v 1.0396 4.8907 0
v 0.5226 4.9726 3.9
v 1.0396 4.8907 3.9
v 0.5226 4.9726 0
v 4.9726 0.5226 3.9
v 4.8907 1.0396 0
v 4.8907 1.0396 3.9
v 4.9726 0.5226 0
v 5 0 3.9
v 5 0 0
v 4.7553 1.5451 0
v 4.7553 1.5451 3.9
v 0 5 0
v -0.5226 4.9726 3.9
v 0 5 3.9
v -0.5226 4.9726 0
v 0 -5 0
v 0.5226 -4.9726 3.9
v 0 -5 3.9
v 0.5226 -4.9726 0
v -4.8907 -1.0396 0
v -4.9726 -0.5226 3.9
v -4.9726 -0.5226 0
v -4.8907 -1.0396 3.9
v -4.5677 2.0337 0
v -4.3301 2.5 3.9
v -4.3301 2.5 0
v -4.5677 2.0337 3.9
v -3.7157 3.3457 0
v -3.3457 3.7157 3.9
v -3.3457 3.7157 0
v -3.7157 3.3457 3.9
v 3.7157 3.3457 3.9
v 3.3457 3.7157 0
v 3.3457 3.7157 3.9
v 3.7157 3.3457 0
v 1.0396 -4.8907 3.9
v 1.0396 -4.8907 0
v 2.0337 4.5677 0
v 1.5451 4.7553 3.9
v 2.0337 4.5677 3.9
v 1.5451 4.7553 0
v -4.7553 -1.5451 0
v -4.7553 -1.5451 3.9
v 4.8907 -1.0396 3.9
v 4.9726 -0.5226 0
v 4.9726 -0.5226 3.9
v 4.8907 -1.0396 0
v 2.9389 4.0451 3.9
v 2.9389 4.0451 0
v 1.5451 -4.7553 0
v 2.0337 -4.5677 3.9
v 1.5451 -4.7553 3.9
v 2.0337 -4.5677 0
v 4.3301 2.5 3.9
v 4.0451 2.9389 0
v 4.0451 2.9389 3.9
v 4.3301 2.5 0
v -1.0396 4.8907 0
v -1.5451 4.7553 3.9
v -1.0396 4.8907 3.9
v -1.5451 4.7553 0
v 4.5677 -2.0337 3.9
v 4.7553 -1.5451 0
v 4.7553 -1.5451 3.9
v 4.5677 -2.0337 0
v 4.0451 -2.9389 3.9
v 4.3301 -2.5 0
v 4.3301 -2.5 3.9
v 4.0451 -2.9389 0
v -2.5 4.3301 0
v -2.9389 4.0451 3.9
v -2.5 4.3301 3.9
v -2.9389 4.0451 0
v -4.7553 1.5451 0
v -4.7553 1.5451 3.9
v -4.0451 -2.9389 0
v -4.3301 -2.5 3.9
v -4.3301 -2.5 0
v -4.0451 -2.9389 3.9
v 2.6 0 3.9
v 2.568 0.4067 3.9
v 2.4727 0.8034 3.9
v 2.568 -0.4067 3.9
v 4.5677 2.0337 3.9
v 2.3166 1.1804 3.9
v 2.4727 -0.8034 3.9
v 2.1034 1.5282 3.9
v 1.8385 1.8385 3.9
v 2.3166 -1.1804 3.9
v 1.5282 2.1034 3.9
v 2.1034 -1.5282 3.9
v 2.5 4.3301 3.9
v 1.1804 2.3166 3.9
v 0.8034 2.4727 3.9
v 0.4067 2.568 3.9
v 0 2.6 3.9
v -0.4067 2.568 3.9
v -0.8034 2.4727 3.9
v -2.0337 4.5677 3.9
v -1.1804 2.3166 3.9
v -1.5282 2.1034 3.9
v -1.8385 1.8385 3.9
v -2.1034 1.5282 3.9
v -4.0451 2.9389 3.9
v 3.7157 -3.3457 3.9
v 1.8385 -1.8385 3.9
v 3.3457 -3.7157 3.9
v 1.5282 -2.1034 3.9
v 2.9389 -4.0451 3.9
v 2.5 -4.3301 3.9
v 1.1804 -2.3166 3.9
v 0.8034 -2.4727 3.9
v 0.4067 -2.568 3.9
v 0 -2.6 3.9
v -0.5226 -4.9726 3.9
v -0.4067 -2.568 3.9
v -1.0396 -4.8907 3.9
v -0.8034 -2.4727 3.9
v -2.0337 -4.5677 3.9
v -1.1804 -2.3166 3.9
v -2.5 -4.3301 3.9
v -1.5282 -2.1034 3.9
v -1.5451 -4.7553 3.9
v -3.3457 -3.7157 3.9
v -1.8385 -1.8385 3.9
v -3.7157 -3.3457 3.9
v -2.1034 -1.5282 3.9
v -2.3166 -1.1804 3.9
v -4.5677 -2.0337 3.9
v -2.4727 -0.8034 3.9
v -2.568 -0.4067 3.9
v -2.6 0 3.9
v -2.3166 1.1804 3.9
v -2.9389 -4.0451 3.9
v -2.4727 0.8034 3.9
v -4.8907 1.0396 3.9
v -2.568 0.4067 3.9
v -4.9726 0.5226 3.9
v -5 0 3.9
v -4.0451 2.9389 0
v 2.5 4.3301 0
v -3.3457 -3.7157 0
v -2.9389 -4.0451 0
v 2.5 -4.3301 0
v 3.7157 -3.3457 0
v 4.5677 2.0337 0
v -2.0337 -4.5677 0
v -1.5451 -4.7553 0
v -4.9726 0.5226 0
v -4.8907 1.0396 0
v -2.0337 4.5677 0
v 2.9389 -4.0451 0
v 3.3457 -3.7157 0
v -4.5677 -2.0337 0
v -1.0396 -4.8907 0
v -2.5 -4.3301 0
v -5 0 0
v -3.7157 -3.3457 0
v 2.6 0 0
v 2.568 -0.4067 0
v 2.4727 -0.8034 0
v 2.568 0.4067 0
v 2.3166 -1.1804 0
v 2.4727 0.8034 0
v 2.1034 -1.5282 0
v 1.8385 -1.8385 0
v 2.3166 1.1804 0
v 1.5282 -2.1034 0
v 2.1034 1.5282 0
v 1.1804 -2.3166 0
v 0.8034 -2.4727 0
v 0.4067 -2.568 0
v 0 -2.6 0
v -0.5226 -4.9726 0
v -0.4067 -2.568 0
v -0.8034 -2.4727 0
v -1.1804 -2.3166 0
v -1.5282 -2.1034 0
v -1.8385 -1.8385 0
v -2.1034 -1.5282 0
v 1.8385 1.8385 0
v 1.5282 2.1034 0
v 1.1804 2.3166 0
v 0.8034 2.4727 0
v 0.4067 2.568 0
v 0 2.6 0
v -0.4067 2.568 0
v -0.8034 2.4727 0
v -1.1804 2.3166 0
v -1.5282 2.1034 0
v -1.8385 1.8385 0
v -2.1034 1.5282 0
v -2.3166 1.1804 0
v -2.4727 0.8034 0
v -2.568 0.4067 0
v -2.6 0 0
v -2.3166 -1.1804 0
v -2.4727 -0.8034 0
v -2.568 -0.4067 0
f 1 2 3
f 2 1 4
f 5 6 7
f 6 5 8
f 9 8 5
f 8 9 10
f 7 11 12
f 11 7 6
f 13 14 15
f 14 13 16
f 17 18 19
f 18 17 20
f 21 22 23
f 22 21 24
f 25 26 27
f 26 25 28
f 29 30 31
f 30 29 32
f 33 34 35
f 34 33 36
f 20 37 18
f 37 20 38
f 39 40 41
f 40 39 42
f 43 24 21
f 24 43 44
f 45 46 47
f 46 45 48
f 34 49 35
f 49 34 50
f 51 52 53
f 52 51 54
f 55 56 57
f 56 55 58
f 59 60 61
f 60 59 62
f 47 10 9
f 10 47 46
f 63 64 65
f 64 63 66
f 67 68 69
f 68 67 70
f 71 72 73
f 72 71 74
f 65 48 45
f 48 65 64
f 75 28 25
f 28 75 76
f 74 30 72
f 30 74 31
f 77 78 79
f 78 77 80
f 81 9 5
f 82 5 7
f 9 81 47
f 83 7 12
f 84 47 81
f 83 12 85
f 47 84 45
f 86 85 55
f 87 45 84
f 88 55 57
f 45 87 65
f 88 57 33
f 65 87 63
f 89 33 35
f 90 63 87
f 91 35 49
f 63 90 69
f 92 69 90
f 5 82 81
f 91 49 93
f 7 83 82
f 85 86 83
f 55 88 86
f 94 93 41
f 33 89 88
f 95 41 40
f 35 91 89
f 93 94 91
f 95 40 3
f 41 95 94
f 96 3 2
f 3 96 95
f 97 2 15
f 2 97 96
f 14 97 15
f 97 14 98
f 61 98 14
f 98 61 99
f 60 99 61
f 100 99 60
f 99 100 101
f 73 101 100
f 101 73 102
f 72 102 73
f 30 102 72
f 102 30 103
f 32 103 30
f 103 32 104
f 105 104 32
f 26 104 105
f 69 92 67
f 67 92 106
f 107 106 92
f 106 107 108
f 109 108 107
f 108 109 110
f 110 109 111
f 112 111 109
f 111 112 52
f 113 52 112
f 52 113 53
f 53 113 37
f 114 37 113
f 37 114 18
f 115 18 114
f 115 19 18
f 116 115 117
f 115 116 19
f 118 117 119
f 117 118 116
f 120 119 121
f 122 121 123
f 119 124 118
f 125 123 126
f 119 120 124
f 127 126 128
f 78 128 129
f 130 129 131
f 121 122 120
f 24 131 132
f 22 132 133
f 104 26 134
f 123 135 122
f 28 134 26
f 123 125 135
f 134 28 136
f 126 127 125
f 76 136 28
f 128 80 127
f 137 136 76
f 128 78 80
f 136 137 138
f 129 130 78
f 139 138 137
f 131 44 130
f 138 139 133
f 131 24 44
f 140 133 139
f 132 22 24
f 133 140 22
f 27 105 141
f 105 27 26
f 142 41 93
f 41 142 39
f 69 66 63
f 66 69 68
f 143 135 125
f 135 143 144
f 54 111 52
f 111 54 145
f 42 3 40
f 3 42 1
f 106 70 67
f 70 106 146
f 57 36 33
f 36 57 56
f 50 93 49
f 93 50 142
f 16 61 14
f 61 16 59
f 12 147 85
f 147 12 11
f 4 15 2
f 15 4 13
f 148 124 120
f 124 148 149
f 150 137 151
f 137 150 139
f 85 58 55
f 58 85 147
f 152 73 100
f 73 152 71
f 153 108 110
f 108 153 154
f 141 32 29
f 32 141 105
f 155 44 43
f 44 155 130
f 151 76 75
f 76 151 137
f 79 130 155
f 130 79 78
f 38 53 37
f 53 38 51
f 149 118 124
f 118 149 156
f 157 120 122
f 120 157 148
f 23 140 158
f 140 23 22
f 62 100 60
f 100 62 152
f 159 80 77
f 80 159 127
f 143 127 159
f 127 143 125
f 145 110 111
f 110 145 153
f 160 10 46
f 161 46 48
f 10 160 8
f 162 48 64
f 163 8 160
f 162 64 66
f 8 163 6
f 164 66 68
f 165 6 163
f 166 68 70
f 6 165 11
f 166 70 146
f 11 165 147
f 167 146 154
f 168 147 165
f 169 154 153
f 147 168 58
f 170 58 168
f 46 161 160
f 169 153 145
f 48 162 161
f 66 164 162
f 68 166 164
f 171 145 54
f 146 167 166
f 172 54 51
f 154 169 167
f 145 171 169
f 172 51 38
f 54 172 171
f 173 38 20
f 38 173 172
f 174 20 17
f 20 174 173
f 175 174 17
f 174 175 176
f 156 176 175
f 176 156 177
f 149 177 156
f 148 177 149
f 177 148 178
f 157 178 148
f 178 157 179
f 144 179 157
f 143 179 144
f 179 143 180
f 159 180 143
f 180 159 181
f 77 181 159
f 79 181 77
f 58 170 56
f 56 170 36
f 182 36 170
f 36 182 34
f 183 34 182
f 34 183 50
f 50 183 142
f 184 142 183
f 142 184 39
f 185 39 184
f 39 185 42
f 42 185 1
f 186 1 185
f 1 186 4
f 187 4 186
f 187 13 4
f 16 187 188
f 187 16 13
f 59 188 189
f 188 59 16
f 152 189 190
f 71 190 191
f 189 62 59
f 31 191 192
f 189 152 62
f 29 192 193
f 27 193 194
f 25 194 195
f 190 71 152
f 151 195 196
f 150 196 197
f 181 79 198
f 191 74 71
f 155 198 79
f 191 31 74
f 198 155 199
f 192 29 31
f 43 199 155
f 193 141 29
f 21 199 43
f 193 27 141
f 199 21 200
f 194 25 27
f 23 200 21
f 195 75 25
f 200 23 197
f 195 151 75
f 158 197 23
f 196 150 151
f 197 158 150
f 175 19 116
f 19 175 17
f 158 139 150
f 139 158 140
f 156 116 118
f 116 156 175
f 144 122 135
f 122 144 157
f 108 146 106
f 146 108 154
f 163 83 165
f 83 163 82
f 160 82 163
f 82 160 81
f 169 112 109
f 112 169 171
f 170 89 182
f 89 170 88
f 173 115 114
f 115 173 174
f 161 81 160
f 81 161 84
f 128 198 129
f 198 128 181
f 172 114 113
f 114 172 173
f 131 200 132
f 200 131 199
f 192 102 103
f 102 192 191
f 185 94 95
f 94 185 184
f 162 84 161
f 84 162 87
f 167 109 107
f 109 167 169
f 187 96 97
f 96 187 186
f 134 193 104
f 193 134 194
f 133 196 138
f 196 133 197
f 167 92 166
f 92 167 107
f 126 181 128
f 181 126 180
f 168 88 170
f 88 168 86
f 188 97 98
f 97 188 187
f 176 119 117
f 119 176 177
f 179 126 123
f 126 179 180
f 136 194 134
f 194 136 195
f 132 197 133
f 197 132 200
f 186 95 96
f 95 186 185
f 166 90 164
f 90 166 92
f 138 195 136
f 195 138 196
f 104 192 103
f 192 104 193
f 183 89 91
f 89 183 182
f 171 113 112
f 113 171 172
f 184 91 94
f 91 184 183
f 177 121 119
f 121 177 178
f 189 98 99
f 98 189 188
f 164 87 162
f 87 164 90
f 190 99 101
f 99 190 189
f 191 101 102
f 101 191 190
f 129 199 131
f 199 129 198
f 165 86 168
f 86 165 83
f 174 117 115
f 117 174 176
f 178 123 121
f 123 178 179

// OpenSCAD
// RebeliX
//
// extruder washer
// GNU GPL v3
// Martin Neruda
// http://www.reprap4u.cz

//height = 3.2;
//height = 2;
//height = 3.5;
//height = 3.8;
height = 3.9;

difference(){
	cylinder(r=5, h=height, $fn=60);
	translate([0,0,-0.1]) cylinder(r=2.6, h=7, $fn=40);
}	
